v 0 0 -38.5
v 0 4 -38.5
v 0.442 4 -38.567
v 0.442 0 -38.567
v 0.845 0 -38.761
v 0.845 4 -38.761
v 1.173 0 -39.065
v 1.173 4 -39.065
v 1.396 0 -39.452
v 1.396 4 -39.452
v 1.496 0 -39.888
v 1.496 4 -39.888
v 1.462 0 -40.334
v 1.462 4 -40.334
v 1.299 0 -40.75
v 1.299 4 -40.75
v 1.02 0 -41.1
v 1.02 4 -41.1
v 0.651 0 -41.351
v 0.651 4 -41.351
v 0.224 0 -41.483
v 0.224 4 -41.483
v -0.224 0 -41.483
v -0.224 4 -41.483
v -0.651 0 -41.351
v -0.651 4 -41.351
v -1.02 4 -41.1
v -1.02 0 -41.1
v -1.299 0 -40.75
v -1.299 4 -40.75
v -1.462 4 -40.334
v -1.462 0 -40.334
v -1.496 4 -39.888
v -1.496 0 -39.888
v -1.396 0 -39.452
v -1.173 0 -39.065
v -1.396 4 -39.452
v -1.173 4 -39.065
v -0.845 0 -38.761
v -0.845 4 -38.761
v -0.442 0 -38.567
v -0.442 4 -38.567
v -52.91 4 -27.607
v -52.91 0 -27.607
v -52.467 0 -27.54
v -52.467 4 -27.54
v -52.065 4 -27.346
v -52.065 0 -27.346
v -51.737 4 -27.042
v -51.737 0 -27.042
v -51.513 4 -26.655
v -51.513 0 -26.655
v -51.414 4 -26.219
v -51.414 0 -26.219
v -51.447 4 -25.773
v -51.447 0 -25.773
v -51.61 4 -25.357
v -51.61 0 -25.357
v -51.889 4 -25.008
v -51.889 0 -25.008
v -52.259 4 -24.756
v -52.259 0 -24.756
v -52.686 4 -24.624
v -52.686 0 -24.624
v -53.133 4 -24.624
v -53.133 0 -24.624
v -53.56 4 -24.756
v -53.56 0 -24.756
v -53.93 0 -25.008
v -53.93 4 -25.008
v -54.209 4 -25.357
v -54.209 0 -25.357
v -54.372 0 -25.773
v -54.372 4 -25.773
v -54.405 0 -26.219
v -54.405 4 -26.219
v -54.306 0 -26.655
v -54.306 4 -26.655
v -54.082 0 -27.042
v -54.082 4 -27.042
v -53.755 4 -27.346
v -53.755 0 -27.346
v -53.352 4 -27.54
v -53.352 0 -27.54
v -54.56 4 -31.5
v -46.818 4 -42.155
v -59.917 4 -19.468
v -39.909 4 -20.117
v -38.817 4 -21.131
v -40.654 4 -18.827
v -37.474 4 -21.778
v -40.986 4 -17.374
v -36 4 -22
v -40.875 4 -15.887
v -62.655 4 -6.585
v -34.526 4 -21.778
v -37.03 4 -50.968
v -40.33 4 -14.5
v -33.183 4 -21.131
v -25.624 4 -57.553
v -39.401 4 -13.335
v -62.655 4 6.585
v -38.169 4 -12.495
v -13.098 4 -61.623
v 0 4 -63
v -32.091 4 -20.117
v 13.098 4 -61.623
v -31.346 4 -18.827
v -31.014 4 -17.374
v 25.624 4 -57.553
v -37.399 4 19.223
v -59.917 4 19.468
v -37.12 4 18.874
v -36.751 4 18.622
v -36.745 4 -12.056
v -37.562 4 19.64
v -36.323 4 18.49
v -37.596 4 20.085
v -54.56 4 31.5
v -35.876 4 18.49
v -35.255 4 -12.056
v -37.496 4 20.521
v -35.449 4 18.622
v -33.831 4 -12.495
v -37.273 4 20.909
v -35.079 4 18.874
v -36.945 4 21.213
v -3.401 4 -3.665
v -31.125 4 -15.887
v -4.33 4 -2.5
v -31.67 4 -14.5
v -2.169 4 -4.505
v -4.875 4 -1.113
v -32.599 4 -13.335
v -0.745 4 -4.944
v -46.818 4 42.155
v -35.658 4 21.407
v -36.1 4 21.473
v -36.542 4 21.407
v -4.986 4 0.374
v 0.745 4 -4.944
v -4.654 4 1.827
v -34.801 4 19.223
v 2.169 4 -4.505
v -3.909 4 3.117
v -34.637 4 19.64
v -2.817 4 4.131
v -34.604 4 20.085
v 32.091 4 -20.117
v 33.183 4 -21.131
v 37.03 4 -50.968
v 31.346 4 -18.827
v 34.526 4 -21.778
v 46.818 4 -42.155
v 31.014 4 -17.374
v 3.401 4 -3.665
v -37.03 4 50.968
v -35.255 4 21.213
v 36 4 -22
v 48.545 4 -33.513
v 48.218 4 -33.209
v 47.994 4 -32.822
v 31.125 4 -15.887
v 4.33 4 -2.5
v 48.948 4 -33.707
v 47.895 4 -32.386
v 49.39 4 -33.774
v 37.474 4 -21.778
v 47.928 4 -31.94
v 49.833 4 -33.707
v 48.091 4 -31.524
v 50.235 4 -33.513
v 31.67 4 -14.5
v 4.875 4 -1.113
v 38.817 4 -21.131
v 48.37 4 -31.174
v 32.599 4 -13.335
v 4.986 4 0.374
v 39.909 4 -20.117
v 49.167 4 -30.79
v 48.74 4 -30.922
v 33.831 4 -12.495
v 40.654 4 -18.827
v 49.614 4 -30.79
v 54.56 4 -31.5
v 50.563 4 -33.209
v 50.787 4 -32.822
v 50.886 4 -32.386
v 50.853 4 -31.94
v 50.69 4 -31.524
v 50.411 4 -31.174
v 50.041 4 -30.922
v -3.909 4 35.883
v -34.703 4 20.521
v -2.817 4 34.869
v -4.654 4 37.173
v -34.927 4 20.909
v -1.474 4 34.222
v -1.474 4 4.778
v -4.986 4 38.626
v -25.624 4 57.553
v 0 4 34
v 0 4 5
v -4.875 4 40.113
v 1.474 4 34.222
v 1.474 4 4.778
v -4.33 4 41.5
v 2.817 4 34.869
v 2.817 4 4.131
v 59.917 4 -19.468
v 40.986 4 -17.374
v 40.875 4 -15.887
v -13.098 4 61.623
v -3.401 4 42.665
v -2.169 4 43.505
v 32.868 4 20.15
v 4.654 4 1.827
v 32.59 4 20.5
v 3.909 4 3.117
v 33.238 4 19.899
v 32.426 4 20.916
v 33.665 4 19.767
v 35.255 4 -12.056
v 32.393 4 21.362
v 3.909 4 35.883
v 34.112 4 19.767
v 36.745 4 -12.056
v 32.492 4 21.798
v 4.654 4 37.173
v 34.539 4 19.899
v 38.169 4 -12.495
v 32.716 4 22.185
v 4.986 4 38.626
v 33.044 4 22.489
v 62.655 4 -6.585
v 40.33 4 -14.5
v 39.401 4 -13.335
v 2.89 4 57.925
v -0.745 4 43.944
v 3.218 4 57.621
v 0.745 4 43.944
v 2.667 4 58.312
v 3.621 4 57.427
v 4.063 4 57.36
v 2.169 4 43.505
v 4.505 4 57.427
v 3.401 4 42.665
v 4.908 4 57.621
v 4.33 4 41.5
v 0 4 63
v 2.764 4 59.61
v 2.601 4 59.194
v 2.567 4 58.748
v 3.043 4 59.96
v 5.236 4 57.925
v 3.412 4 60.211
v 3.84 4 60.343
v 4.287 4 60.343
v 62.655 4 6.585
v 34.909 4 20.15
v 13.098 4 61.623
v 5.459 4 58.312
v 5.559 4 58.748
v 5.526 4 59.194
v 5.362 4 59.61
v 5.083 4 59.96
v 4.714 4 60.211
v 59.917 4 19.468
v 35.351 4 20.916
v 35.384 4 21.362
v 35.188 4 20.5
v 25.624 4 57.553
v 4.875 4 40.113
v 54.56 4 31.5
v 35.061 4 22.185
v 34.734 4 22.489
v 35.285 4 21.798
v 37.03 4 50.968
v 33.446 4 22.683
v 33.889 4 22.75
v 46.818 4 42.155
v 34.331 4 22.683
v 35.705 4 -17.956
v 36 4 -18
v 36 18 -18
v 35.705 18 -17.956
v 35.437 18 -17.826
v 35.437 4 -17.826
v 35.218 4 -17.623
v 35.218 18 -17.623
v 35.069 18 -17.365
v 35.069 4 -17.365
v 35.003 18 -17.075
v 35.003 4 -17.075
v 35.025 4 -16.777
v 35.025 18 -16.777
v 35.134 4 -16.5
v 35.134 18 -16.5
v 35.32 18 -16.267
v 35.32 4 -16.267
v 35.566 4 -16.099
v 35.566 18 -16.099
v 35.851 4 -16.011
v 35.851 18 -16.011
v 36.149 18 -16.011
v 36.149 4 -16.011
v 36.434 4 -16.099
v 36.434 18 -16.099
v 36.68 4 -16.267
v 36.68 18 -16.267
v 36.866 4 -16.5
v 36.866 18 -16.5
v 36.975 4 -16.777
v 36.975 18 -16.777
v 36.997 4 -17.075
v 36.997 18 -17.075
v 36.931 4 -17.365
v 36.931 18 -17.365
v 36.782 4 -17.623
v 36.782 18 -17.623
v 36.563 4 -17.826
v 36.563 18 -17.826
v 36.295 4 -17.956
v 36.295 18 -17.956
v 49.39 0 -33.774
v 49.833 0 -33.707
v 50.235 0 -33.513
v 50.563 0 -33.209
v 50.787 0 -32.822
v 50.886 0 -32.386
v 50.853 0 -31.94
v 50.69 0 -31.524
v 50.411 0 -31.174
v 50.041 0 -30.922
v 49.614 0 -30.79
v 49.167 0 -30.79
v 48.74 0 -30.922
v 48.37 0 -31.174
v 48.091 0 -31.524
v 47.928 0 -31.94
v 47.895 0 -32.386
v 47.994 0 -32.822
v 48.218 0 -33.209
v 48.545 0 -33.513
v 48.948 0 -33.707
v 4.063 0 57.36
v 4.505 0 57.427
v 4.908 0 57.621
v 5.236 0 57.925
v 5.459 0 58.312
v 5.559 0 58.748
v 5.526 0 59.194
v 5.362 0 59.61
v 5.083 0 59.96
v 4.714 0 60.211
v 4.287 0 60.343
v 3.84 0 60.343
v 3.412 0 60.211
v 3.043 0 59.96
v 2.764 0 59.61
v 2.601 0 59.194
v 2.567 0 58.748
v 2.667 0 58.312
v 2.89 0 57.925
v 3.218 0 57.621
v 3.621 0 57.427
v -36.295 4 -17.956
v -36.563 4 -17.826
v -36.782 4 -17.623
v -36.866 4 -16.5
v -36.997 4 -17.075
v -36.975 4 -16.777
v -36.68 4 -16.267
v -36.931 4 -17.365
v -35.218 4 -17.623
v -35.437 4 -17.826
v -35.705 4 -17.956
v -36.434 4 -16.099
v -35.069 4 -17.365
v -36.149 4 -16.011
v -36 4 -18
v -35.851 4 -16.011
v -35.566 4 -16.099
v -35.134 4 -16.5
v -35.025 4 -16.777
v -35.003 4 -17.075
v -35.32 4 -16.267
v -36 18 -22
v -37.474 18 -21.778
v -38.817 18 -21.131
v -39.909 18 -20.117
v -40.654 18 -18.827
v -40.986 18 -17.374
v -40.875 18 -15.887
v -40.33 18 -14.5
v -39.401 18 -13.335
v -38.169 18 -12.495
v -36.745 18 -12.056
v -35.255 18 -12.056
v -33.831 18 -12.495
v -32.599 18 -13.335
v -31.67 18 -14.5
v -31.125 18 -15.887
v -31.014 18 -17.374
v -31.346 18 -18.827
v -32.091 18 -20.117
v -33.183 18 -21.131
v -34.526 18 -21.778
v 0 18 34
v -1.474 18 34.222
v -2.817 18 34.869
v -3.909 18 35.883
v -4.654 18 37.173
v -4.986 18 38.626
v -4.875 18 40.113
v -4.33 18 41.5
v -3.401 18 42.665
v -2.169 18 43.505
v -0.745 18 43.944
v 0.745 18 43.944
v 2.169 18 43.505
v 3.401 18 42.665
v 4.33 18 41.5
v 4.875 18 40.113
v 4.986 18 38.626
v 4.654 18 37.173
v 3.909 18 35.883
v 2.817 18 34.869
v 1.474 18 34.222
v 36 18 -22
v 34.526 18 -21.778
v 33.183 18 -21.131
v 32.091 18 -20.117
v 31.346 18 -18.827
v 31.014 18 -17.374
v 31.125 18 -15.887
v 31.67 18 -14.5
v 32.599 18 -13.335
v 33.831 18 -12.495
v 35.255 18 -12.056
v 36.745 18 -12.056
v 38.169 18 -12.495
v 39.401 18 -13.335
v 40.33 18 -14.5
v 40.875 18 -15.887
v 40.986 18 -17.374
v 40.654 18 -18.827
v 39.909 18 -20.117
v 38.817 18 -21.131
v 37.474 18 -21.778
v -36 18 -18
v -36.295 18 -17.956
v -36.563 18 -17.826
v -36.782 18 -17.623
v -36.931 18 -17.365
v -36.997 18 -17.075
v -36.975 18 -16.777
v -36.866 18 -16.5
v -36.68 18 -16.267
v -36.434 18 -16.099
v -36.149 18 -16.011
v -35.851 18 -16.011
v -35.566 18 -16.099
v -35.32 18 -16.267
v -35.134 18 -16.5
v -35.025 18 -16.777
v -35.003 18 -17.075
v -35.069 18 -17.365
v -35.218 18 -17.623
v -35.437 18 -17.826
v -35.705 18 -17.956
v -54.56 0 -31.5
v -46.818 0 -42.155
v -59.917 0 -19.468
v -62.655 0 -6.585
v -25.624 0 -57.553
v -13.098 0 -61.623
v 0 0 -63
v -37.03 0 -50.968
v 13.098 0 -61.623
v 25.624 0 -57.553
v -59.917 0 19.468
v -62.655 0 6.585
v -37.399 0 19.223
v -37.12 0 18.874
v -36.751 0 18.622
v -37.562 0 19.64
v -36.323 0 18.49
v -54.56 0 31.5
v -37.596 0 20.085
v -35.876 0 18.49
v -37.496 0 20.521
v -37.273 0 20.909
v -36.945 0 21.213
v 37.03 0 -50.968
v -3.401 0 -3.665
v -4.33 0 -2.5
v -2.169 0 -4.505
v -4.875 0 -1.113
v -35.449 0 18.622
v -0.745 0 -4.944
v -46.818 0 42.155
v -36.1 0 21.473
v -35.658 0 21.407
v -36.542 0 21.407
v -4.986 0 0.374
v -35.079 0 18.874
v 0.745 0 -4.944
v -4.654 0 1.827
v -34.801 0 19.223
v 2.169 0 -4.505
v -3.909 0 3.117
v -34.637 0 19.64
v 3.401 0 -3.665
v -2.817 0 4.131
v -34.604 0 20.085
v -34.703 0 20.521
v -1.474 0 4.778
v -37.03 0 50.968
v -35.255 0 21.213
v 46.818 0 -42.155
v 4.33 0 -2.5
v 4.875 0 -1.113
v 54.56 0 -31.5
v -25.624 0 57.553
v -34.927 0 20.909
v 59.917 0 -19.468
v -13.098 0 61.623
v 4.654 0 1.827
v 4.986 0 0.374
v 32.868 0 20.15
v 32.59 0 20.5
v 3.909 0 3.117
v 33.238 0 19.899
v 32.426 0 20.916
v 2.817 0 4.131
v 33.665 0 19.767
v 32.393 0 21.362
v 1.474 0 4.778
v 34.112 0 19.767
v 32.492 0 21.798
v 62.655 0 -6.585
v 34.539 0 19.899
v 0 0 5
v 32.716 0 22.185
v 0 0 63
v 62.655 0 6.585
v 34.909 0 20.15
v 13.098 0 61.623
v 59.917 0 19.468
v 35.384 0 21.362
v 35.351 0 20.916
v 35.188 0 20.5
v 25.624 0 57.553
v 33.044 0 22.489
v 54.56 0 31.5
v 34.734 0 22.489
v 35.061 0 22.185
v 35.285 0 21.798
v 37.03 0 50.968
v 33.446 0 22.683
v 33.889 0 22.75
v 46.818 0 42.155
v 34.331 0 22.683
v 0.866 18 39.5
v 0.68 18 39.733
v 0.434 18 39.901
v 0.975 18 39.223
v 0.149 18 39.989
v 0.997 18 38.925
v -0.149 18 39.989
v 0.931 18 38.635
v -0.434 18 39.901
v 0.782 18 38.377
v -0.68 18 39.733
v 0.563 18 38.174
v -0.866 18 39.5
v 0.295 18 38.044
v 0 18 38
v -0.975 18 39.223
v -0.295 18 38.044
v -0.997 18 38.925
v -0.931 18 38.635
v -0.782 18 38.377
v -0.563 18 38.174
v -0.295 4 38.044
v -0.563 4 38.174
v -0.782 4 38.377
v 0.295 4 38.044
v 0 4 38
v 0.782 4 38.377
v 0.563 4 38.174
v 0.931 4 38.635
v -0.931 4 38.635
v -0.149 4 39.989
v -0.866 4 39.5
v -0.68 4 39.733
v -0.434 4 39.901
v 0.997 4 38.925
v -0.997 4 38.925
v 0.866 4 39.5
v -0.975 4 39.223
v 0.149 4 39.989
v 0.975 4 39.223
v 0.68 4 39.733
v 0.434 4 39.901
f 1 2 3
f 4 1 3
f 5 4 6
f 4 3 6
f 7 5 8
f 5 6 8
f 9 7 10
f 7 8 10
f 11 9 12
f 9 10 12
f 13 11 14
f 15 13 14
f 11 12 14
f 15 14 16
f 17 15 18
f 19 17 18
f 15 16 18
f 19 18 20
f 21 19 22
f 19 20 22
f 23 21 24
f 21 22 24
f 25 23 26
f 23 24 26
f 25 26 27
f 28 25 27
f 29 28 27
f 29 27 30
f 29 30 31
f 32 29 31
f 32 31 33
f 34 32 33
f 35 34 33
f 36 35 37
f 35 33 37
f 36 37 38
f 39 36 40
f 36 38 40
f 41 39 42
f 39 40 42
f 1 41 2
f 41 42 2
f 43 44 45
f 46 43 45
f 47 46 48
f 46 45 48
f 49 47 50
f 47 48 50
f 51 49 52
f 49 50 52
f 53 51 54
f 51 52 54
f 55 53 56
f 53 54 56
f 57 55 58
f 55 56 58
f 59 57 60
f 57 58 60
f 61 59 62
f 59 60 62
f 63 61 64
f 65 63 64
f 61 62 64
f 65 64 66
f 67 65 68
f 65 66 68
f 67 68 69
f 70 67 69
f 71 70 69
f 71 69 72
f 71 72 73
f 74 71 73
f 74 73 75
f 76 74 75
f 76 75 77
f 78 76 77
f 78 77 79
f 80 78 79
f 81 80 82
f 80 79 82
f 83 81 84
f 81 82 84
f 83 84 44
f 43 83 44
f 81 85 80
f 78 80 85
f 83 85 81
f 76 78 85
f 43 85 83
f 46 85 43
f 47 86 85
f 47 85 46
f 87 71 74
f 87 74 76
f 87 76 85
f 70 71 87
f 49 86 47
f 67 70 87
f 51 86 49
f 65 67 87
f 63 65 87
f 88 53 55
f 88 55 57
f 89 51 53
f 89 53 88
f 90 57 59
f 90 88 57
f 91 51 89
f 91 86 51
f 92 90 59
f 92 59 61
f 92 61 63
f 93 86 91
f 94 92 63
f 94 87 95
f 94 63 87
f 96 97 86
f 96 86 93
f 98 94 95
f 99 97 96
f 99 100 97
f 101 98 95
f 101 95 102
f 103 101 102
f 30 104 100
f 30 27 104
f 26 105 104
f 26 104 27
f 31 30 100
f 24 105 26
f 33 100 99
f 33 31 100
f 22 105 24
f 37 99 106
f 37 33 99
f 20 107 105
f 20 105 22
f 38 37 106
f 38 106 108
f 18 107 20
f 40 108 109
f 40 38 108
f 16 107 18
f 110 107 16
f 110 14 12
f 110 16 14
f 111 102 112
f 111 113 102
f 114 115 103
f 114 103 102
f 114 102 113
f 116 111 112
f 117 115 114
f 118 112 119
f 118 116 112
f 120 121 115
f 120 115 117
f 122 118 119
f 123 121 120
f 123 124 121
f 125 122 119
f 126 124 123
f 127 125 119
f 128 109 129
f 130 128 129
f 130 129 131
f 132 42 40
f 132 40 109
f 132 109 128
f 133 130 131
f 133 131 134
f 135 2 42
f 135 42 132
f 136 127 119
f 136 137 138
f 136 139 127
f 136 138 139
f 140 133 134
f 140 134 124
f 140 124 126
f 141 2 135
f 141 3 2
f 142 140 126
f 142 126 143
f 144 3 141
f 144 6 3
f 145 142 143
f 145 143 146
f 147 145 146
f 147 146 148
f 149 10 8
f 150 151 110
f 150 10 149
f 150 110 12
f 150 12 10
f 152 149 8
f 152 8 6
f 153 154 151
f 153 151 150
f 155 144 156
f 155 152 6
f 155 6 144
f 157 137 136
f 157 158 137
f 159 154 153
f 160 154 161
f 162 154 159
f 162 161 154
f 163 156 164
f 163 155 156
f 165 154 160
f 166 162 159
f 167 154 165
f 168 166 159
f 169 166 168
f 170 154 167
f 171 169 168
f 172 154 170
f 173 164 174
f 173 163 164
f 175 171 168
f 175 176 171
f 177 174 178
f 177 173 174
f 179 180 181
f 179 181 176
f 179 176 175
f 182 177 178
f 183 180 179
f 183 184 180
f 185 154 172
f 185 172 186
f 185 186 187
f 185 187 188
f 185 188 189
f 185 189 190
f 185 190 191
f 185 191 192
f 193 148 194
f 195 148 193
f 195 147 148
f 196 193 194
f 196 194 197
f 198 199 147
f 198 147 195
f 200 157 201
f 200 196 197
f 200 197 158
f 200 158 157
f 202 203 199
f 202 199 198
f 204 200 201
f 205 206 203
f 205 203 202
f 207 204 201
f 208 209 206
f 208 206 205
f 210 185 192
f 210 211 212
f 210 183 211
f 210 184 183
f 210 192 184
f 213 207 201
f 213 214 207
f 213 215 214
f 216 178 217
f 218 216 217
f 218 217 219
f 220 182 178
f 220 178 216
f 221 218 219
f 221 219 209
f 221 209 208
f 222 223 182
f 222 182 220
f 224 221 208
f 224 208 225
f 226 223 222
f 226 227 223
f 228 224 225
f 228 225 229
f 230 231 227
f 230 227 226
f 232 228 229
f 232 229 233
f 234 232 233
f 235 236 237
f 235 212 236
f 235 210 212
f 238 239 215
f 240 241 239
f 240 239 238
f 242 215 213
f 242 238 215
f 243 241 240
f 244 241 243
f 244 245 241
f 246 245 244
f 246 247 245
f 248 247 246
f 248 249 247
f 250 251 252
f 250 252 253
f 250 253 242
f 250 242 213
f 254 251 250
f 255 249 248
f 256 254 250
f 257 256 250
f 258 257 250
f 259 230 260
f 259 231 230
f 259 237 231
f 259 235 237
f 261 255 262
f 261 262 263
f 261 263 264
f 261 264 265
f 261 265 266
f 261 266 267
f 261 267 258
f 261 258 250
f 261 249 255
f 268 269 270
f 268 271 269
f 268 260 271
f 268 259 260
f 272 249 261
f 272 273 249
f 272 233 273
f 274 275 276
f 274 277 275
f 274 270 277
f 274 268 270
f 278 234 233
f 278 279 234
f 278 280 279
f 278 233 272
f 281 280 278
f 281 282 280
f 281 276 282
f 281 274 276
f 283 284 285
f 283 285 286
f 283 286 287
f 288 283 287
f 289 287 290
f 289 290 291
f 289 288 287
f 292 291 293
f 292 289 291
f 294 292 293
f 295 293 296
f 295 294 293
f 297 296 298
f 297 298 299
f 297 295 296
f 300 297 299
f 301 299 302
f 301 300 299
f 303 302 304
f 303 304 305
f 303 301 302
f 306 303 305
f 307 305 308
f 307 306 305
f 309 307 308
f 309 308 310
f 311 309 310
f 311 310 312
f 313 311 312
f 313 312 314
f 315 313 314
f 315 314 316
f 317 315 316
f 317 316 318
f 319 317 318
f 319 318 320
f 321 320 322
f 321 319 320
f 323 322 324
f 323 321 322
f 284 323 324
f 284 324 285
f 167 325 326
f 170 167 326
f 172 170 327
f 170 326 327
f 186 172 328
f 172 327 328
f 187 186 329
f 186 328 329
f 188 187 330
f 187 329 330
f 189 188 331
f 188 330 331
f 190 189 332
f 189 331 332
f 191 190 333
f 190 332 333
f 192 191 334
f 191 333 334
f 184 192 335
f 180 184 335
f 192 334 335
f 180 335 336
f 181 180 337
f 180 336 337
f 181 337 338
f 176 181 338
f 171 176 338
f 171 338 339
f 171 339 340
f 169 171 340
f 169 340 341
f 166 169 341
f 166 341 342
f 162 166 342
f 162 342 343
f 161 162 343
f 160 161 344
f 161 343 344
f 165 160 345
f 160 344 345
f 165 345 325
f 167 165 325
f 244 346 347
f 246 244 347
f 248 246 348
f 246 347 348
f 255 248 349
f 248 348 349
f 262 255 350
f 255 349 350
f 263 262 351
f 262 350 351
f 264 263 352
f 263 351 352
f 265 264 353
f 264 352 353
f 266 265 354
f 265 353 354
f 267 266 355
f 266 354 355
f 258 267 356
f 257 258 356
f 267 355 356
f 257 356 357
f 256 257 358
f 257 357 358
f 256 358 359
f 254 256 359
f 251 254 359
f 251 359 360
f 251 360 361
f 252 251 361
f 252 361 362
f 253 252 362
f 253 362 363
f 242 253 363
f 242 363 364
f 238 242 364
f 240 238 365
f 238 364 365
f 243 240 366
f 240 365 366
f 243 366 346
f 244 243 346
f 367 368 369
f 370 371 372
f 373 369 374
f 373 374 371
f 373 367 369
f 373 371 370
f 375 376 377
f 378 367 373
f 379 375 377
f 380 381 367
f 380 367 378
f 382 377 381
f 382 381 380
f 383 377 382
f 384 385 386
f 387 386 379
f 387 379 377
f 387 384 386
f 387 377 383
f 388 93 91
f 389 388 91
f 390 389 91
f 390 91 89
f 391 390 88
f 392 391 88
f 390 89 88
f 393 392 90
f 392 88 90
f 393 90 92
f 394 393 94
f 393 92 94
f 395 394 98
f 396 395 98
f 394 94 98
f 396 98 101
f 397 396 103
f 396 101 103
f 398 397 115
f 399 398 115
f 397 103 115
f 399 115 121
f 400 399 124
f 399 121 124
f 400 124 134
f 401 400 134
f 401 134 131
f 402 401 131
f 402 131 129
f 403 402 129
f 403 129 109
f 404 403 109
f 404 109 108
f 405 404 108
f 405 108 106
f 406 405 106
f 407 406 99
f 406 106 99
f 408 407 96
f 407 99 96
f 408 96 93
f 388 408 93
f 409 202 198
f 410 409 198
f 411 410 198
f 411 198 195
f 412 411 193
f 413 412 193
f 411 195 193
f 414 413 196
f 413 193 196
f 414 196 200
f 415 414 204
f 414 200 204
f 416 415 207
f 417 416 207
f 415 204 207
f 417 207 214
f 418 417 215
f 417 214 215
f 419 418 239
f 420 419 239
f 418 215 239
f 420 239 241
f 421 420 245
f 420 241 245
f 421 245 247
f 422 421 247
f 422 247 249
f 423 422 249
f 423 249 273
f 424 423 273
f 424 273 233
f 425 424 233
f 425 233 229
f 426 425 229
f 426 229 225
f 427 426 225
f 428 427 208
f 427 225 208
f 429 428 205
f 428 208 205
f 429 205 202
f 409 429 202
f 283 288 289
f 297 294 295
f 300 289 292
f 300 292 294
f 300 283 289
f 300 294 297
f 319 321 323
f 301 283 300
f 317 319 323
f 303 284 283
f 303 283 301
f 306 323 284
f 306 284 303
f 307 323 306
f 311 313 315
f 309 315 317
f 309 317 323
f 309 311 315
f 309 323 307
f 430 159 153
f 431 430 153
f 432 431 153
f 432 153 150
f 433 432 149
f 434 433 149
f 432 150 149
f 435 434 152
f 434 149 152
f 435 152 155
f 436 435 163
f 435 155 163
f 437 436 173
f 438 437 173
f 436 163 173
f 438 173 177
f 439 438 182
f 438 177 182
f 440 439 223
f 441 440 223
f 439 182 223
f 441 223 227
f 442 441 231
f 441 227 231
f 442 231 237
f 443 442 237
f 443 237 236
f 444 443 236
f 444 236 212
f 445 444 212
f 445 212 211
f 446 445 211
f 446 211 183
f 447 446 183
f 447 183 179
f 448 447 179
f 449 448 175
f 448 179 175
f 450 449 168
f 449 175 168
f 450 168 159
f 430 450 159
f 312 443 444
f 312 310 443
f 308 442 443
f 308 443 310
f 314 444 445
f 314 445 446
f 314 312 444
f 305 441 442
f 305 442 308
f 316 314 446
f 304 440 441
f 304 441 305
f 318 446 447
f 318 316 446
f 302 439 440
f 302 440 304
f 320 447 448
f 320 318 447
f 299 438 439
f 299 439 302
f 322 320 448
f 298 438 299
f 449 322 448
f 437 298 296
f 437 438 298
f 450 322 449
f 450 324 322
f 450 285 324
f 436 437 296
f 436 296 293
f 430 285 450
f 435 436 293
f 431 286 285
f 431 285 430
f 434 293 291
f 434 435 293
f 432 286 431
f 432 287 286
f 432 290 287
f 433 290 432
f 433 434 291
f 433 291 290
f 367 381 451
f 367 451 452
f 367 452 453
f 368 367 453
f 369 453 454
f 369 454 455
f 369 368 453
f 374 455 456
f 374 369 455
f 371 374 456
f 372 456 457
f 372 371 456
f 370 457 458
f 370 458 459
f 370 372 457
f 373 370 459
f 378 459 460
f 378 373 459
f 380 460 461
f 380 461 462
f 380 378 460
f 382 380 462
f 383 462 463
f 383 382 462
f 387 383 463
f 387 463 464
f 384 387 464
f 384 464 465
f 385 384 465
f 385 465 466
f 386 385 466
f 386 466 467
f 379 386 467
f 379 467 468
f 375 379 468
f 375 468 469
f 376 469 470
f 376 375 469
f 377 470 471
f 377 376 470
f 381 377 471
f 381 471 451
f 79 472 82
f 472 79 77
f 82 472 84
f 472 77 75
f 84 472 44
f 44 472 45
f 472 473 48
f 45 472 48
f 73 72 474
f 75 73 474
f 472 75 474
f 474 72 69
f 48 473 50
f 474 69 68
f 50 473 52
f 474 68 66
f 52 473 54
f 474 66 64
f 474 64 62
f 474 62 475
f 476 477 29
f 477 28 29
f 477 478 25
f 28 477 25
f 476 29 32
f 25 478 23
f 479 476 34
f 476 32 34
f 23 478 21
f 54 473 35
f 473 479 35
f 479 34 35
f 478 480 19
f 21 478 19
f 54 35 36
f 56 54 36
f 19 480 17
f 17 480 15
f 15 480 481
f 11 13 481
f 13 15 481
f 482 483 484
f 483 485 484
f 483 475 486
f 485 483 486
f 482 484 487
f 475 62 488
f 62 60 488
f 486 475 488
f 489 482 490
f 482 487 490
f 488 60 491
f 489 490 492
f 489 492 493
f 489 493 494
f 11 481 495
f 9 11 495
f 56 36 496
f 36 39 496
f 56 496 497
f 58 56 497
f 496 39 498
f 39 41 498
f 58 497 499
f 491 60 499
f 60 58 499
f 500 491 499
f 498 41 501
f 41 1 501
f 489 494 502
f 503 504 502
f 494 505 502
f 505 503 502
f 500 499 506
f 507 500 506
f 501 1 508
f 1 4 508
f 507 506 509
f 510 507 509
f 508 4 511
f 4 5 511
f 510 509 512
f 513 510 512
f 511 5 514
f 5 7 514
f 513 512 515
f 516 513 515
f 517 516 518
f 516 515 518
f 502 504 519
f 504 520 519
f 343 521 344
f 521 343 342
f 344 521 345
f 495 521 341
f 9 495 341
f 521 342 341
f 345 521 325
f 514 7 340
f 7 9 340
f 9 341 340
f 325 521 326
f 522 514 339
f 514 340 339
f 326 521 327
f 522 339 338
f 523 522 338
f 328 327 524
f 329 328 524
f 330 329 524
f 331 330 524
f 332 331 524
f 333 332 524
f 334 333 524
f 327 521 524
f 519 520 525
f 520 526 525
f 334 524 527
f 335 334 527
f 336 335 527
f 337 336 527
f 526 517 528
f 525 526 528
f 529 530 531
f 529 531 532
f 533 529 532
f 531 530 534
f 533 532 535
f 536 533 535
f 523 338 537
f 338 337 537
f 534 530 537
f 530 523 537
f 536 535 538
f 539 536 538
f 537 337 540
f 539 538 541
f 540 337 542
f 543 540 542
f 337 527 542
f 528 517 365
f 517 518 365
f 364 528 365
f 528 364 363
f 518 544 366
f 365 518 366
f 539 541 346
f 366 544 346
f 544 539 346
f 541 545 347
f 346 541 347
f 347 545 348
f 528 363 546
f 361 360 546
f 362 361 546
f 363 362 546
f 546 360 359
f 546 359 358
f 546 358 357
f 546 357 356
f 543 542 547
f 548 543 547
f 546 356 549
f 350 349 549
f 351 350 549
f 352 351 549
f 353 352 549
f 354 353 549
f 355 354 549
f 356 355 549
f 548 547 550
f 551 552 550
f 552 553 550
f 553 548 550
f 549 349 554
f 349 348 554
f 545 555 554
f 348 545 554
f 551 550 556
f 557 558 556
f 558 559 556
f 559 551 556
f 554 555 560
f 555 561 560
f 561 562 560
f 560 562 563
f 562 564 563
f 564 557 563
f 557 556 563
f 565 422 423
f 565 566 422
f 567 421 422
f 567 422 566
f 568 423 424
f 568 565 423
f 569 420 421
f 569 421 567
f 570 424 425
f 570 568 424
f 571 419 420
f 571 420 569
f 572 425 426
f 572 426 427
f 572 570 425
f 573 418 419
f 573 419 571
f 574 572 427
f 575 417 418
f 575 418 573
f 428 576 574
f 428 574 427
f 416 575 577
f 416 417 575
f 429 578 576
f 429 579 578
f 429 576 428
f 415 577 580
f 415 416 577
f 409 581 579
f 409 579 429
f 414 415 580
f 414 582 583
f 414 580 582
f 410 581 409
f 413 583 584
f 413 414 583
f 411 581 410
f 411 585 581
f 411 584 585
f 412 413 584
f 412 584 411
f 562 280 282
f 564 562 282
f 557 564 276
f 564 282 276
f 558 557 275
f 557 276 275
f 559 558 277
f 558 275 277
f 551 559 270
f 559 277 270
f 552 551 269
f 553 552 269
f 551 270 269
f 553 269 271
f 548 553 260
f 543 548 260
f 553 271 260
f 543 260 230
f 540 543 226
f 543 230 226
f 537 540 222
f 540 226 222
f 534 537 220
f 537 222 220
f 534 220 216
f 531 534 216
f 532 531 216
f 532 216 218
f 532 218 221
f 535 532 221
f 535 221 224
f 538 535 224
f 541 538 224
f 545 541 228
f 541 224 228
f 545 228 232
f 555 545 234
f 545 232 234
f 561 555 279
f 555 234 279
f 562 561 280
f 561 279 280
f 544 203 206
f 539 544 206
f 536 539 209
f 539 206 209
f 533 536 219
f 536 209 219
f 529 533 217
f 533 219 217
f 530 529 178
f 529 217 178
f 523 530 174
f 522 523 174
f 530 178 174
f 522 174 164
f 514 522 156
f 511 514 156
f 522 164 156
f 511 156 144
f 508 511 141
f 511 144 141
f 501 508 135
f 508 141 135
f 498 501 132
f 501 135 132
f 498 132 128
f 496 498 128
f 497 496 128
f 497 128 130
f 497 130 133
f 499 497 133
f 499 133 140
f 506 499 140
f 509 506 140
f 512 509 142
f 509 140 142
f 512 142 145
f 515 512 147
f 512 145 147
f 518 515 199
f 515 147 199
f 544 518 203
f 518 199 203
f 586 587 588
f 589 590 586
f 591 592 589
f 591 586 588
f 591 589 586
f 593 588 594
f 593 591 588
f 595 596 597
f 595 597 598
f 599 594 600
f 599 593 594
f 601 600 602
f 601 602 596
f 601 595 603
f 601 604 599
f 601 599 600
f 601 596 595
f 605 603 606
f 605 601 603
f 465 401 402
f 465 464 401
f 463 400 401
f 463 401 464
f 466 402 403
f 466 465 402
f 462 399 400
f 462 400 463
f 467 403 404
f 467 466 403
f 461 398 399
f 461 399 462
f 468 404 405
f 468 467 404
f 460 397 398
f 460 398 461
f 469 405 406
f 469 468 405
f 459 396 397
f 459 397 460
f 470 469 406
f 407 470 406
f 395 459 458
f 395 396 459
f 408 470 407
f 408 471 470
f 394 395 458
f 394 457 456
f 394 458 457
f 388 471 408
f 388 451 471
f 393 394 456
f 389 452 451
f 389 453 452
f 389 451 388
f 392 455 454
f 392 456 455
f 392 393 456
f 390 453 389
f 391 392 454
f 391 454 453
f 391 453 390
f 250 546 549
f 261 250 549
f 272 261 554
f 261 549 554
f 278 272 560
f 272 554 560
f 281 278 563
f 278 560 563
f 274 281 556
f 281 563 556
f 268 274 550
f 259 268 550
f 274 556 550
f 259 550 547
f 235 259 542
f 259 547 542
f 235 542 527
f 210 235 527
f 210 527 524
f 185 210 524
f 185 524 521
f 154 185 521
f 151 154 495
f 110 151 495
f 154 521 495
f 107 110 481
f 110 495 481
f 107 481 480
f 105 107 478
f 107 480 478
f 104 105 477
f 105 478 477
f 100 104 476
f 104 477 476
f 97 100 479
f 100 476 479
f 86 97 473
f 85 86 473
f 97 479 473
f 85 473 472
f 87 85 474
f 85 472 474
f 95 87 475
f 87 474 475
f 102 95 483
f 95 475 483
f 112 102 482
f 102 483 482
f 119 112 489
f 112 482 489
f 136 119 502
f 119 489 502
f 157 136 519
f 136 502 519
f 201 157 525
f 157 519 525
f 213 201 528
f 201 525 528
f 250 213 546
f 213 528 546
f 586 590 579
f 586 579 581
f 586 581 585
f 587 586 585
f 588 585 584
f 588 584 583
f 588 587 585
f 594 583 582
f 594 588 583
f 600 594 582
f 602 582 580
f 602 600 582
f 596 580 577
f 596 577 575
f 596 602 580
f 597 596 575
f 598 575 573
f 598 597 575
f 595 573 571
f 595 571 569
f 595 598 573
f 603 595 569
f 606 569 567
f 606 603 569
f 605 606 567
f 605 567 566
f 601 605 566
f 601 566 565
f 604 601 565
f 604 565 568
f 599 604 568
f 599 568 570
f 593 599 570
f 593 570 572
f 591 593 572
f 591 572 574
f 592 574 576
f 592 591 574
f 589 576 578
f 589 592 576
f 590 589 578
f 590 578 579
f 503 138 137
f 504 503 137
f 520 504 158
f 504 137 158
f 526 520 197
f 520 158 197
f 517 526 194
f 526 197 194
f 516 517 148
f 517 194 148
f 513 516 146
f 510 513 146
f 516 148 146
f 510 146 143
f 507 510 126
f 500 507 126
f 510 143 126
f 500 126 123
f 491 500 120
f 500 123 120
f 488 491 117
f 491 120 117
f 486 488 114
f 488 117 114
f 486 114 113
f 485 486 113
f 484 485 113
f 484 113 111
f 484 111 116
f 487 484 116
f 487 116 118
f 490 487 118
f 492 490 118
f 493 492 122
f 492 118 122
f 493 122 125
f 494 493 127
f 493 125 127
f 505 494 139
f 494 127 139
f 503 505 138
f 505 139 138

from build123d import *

# Parameters (mm, degrees)
SKETCH2_R           = 63
BOSS_EXTRUDE2_DEPTH = 4
SKETCH3_R           = 5
CUT_EXTRUDE1_DEPTH  = 4
SKETCH4_R           = 5
SKETCH4_R_2         = 1
BOSS_EXTRUDE3_DEPTH = 14
SKETCH5_R           = 1.5
CUT_EXTRUDE3_DEPTH  = 4
SKETCH7_R           = 1.5
CUT_EXTRUDE6_DEPTH  = 4


with BuildPart() as part:
    # Sketch2 → Boss-Extrude2 (new body)
    with BuildSketch(Plane(origin=(0, 0, 0), x_dir=(1, 0, 0), z_dir=(0, 1, 0))):
        with Locations(Location((0, 0, 0), (0, 0, 270))):
            Circle(SKETCH2_R)
    extrude(amount=BOSS_EXTRUDE2_DEPTH)

    # Sketch3 → Cut-Extrude1 (cut)
    with BuildSketch(Plane(origin=(0, 4, 0), x_dir=(1, 0, 0), z_dir=(0, 1, 0))):
        with Locations(Location((0, 0, 0), (0, 0, 270))):
            Circle(SKETCH3_R)
    extrude(amount=-CUT_EXTRUDE1_DEPTH, mode=Mode.SUBTRACT)

    # Sketch4 → Boss-Extrude3 (add)
    # profile 1 of 3: a face of its own
    with BuildSketch(Plane(origin=(0, 4, 0), x_dir=(1, 0, 0), z_dir=(0, 1, 0))):
        with Locations(Location((-36, 17, 0), (0, 0, 90))):
            Circle(SKETCH4_R)
        with Locations(Location((-36, 17, 0), (0, 0, 90))):
            Circle(SKETCH4_R_2, mode=Mode.SUBTRACT)
    # profile 2 of 3: a face of its own
    with BuildSketch(Plane(origin=(0, 4, 0), x_dir=(1, 0, 0), z_dir=(0, 1, 0))):
        with Locations(Location((36, 17, 0), (0, 0, 90))):
            Circle(SKETCH4_R)
        with Locations(Location((36, 17, 0), (0, 0, 90))):
            Circle(SKETCH4_R_2, mode=Mode.SUBTRACT)
    # profile 3 of 3: a face of its own
    with BuildSketch(Plane(origin=(0, 4, 0), x_dir=(1, 0, 0), z_dir=(0, 1, 0))):
        with Locations(Location((0, -39, 0), (0, 0, 90))):
            Circle(SKETCH4_R)
        with Locations(Location((0, -39, 0), (0, 0, 90))):
            Circle(SKETCH4_R_2, mode=Mode.SUBTRACT)
    extrude(amount=BOSS_EXTRUDE3_DEPTH)

    # Sketch5 → Cut-Extrude3 (cut)
    with BuildSketch(Plane(origin=(0, 4, 0), x_dir=(1, 0, 0), z_dir=(0, 1, 0))):
        with Locations(Location((33.888604279, -21.25, 0), (0, 0, 270))):
            Circle(SKETCH5_R)
        with Locations(Location((-36.099753842, -19.973392205, 0), (0, 0, 270))):
            Circle(SKETCH5_R)
        with Locations(Location((0, 40, 0), (0, 0, 270))):
            Circle(SKETCH5_R)
    extrude(amount=-CUT_EXTRUDE3_DEPTH, mode=Mode.SUBTRACT)

    # Sketch7 → Cut-Extrude6 (cut)
    with BuildSketch(Plane.XZ):
        with Locations(Location((4.063188835, 58.859922668, 0), (0, 0, 270))):
            Circle(SKETCH7_R)
        with Locations(Location((-52.909524673, -26.107129273, 0), (0, 0, 270))):
            Circle(SKETCH7_R)
        with Locations(Location((49.390475327, -32.273533227, 0), (0, 0, 270))):
            Circle(SKETCH7_R)
    extrude(amount=-CUT_EXTRUDE6_DEPTH, mode=Mode.SUBTRACT)


solid = part.part
